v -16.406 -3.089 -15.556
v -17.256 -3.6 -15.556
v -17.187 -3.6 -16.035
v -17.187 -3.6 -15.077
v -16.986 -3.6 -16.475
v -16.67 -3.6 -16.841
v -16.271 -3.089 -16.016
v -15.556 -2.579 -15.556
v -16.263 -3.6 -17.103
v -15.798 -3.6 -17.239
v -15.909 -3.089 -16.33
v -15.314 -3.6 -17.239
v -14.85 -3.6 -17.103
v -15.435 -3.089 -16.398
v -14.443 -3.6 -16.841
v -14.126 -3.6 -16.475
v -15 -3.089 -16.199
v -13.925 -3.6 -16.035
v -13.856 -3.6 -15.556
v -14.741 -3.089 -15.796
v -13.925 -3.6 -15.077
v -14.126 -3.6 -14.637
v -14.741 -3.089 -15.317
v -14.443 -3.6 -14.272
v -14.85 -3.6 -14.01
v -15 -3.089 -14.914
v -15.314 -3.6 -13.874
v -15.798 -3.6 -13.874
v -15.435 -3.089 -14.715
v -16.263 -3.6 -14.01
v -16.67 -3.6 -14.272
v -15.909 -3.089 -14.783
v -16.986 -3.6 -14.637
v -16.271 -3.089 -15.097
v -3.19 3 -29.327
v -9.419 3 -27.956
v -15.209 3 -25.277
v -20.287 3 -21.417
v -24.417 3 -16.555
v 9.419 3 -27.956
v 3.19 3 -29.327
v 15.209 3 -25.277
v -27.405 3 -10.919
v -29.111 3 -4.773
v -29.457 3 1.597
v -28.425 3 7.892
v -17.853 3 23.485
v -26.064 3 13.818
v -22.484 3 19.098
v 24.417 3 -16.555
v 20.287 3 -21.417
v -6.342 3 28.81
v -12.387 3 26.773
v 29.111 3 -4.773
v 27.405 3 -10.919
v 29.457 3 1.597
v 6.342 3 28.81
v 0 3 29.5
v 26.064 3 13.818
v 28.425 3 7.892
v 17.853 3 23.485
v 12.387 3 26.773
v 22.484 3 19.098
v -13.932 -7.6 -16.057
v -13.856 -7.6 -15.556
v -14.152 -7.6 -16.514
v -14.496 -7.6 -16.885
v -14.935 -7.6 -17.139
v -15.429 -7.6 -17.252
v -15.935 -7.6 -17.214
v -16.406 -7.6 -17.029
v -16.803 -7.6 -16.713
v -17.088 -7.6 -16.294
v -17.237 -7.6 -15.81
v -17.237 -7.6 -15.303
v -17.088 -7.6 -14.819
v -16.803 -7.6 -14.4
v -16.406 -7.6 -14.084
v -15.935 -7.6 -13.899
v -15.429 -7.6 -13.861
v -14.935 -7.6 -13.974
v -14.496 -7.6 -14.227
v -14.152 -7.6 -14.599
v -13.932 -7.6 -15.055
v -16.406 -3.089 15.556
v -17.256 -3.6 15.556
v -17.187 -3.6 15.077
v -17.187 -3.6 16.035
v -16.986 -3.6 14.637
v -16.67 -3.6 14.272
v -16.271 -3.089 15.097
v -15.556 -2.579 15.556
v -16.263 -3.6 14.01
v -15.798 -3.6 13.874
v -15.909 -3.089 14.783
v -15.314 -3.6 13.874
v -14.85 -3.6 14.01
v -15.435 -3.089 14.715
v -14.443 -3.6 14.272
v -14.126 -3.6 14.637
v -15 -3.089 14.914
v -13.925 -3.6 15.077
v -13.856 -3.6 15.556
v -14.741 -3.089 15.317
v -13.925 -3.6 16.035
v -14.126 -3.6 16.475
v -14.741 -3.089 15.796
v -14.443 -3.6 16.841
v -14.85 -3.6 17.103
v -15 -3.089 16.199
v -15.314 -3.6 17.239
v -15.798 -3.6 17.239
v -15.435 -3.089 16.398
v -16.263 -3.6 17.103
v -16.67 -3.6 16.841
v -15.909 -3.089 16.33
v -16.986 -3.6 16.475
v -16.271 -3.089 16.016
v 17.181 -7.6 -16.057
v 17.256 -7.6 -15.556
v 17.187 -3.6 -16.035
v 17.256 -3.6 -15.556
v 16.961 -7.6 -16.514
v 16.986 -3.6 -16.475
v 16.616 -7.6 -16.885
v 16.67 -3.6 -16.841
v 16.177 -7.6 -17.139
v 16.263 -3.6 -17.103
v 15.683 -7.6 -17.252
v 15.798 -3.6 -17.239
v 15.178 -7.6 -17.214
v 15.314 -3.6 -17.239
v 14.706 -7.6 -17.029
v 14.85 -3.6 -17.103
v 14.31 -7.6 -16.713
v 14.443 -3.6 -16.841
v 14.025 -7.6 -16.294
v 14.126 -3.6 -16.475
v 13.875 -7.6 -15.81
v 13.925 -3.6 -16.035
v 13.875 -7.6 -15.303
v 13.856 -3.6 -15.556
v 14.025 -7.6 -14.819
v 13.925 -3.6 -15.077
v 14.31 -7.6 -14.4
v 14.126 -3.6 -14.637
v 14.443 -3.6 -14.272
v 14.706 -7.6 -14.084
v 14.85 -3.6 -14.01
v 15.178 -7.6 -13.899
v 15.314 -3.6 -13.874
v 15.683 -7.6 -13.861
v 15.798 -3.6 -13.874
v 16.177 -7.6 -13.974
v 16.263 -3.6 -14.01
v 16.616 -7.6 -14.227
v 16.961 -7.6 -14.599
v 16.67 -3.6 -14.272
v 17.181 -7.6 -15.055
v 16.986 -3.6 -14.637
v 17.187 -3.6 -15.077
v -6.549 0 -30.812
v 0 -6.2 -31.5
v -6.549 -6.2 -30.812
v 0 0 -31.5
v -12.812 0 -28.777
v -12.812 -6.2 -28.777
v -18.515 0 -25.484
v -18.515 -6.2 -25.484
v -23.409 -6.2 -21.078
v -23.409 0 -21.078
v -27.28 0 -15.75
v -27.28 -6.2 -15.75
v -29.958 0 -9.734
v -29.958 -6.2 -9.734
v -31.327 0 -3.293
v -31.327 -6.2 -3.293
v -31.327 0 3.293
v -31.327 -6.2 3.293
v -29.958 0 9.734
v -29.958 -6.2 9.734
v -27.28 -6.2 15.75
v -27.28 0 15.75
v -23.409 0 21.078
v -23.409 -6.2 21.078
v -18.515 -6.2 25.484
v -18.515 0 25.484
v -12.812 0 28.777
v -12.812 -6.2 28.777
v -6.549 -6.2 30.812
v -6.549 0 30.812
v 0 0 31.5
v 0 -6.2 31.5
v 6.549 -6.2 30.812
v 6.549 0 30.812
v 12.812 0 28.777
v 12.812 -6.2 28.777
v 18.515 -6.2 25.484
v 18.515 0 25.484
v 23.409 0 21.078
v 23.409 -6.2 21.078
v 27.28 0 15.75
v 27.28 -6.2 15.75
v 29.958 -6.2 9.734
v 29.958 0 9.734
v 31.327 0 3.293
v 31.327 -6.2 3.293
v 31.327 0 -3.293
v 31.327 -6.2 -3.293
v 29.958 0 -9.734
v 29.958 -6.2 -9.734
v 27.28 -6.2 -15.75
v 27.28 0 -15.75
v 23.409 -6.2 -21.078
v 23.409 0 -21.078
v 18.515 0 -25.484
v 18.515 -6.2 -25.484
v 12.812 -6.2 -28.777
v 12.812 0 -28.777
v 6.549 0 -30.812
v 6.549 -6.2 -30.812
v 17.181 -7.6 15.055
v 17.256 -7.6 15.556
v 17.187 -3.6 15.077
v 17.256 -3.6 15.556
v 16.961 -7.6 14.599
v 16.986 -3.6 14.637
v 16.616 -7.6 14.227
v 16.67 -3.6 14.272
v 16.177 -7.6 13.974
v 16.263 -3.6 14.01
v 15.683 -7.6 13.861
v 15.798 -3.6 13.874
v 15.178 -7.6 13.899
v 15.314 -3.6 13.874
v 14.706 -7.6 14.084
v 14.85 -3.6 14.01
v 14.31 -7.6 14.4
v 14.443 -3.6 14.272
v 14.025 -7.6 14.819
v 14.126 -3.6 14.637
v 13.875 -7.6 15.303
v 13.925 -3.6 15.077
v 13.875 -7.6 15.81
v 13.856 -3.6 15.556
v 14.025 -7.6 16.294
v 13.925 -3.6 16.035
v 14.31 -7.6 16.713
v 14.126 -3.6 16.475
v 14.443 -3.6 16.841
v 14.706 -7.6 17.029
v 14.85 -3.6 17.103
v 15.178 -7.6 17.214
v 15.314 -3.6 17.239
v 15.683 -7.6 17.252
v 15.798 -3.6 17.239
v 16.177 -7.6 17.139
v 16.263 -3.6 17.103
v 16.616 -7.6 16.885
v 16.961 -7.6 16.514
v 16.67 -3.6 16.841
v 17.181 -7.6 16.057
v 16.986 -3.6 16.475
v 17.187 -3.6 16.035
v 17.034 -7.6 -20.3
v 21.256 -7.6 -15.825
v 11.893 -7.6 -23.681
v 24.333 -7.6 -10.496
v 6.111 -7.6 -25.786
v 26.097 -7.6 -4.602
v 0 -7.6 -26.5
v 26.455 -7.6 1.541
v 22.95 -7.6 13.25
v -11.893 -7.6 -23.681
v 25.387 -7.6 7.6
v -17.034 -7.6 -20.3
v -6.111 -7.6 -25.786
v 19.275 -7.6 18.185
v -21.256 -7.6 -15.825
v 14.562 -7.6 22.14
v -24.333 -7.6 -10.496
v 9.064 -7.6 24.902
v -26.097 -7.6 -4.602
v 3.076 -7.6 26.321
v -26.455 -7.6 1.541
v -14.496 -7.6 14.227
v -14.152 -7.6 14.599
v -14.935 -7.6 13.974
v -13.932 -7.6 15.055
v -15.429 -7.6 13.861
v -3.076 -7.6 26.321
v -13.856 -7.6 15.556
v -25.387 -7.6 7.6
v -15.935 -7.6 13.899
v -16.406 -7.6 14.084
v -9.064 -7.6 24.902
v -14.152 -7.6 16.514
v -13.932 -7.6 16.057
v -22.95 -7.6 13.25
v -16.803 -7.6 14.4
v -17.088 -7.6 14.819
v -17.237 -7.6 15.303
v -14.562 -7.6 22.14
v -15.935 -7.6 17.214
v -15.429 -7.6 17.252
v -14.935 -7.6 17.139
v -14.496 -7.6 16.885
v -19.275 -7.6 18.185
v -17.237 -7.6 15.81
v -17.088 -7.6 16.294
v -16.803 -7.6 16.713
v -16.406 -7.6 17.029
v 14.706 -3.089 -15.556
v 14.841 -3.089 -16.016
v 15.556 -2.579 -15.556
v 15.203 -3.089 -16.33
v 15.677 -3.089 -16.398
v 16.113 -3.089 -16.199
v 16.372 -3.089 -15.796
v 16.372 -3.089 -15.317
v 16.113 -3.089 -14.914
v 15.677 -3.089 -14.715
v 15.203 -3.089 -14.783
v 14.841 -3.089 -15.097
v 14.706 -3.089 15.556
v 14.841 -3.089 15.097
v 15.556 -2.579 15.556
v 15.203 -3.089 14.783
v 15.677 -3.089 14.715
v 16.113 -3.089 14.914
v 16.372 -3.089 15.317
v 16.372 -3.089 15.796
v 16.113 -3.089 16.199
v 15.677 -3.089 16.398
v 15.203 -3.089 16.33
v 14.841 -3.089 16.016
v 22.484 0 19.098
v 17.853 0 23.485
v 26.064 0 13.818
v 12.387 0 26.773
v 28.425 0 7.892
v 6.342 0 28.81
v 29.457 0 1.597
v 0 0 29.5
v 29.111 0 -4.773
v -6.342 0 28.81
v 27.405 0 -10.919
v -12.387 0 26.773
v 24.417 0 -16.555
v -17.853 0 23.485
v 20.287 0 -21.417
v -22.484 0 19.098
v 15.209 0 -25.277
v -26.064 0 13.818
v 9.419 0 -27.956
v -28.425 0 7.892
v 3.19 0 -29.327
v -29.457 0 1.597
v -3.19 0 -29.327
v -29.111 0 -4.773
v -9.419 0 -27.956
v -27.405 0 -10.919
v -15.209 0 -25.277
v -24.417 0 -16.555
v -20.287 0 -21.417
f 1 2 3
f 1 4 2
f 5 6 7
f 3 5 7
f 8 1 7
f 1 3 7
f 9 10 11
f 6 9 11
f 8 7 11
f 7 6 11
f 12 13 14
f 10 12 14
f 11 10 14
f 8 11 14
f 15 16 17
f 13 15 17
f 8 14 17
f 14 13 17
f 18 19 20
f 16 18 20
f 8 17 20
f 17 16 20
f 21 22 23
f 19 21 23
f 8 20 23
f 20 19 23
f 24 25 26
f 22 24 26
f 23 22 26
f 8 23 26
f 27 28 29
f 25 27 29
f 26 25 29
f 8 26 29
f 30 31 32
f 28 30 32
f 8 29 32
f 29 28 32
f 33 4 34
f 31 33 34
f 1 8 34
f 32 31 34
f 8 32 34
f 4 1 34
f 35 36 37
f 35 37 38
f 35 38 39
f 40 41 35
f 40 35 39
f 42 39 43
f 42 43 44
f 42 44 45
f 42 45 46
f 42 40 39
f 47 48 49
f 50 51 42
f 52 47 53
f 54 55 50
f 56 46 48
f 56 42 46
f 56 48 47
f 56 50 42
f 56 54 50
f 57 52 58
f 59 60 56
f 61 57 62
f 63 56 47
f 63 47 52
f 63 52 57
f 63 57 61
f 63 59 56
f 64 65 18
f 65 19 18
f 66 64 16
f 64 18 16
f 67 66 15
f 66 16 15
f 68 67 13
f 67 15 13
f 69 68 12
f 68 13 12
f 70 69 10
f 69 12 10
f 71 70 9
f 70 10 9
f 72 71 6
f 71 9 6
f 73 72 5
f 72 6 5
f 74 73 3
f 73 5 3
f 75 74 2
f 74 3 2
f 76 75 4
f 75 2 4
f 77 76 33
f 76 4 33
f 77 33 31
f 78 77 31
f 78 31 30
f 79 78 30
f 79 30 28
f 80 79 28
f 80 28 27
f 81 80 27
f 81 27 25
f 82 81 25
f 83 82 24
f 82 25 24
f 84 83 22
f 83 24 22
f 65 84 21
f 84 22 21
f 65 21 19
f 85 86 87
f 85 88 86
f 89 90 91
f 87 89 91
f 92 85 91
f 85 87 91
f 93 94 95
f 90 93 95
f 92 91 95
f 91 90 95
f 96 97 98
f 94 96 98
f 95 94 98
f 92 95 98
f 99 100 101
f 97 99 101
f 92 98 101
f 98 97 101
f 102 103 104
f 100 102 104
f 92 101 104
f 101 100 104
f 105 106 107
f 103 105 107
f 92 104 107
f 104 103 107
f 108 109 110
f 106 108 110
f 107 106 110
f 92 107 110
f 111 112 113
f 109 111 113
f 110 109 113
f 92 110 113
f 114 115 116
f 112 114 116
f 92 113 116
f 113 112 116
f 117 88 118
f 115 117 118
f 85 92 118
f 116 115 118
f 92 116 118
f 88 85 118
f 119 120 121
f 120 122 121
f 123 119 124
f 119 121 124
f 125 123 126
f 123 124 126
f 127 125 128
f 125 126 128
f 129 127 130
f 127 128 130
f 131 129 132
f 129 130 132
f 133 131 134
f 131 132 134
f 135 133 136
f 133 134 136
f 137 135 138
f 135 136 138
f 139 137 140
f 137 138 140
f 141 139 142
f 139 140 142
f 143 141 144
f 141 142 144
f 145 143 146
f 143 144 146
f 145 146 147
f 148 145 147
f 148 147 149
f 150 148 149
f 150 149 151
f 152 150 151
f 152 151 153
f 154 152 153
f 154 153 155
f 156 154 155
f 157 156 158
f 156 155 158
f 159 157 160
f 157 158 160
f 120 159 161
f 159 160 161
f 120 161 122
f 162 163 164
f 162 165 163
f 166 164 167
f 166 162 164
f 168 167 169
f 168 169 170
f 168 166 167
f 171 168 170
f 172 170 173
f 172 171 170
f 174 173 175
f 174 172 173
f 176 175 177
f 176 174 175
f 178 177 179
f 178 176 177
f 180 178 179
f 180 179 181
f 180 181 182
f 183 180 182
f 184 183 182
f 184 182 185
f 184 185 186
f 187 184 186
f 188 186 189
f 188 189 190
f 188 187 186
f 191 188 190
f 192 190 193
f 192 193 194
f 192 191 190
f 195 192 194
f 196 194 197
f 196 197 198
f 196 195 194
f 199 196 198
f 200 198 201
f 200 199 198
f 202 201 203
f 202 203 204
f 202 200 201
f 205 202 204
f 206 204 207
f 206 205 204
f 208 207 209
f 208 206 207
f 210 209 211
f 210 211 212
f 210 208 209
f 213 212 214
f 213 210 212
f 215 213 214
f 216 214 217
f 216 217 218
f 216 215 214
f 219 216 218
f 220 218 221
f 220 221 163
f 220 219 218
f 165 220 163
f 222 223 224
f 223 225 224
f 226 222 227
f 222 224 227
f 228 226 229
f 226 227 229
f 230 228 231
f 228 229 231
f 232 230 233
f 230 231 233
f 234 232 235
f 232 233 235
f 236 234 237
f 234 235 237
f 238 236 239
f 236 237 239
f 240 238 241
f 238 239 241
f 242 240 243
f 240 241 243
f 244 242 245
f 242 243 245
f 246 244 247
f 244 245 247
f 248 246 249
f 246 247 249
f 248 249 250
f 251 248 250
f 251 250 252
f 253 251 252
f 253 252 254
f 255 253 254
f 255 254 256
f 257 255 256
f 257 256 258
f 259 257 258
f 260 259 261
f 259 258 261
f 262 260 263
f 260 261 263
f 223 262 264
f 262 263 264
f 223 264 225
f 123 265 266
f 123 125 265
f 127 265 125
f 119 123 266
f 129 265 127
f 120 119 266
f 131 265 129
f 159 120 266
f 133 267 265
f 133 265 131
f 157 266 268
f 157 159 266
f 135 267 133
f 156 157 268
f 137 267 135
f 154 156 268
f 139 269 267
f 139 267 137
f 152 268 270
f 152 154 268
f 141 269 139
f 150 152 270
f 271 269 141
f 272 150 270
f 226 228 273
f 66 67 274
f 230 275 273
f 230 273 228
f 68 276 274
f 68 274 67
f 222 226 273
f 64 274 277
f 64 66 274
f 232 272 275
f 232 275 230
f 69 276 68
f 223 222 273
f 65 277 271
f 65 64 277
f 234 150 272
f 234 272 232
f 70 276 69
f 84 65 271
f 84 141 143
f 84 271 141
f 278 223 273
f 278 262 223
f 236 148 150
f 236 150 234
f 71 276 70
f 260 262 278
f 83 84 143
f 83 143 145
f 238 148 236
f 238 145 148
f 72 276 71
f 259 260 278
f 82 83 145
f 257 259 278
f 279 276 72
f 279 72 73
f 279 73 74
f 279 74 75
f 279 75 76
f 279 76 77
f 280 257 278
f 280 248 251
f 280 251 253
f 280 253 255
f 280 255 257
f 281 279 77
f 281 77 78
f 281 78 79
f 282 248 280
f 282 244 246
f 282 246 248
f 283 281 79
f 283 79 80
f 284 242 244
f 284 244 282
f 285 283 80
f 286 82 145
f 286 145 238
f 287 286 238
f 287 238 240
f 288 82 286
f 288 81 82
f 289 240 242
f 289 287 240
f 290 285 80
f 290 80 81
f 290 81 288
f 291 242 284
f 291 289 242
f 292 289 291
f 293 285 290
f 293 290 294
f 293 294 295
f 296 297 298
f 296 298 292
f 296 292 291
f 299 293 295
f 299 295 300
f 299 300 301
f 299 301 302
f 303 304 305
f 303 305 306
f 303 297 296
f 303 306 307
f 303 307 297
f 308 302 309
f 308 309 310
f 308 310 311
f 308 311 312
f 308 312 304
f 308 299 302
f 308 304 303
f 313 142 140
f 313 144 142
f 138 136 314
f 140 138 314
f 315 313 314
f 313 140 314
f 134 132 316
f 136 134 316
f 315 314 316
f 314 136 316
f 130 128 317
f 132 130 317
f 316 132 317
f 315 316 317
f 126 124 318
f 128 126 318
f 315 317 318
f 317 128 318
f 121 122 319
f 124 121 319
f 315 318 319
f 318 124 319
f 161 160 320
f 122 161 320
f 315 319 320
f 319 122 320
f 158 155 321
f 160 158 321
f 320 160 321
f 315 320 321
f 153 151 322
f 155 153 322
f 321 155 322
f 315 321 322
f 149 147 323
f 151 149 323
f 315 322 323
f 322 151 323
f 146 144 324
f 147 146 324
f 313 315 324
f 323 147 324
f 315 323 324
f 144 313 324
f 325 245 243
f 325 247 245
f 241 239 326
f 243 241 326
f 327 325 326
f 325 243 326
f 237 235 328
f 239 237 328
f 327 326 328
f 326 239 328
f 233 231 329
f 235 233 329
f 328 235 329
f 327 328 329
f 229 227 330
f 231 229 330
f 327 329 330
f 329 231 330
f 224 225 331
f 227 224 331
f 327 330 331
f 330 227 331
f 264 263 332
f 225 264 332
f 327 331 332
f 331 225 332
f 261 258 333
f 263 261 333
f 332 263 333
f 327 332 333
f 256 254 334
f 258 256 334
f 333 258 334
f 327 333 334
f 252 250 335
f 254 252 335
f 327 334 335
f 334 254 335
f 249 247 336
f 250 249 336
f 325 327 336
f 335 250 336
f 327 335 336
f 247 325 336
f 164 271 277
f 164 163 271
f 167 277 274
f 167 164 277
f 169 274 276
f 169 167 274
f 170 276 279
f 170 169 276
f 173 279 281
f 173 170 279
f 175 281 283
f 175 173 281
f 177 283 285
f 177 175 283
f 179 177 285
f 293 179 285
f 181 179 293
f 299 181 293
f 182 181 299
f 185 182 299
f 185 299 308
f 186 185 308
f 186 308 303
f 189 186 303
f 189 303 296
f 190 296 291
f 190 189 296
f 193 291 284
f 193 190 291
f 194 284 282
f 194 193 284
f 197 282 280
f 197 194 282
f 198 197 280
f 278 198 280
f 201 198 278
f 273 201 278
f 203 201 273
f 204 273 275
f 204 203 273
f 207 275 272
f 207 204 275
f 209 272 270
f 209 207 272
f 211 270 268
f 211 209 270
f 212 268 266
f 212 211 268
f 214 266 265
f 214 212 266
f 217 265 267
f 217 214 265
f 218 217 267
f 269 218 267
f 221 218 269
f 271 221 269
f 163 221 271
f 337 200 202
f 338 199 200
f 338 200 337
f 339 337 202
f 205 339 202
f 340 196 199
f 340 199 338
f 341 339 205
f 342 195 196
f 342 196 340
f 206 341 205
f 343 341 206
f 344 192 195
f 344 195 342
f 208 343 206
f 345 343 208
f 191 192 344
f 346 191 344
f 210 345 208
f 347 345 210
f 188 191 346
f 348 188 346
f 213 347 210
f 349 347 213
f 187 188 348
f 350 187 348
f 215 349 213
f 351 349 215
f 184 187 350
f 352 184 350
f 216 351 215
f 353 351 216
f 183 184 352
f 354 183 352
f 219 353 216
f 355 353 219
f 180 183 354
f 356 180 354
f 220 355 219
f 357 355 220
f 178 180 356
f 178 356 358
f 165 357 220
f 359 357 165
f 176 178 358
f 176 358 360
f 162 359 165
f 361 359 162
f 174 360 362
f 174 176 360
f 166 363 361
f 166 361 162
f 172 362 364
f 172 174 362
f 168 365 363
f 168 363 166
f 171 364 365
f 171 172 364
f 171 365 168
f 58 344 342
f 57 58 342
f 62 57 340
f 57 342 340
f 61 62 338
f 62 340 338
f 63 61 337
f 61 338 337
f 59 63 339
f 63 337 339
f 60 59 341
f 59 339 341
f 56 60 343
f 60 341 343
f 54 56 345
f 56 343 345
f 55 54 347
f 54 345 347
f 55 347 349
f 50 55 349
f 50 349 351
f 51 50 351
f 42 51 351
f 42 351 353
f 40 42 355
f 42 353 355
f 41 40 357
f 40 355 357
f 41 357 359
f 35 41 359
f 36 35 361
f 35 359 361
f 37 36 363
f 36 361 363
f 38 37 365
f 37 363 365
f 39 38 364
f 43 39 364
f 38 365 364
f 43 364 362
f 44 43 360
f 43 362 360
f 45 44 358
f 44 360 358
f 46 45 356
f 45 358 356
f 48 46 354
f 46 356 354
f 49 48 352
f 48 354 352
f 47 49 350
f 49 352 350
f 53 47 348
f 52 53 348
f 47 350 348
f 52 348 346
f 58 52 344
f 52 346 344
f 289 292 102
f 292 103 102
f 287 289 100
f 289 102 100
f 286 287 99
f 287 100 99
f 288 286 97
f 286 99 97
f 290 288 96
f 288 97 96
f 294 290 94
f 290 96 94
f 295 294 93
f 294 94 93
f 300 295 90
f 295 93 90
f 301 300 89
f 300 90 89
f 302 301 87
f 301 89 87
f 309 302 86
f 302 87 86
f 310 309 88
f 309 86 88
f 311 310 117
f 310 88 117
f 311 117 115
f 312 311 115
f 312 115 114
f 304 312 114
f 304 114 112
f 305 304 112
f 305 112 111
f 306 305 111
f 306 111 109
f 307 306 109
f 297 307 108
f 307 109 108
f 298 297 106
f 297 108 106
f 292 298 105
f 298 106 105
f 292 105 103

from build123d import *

# Parameters (mm, degrees)
M3_CLEARANCE_HOLE1_D     = 3.4
M3_CLEARANCE_HOLE1_DEPTH = 4
M3_CLEARANCE_HOLE1_TIP   = 1.021463052
SKETCH5_R                = 29.5
BOSS_EXTRUDE1_DEPTH      = 3


with BuildPart() as part:
    # Sketch1 → Revolve1 (revolve)
    with BuildSketch(Plane.XY, mode=Mode.PRIVATE) as revolve1_sk:
        Polygon((-26.5, -7.6), (-31.5, -6.2), (-31.5, 0), (0, 0), (0, -7.6), align=None)
    revolve(revolve1_sk.sketch.rotate(Axis((0, -13.2, 0), (0, 1, 0)), 270), axis=Axis((0, -13.2, 0), (0, 1, 0)))

    # M3 Clearance Hole1
    with Locations(Plane(origin=(0, -7.6, 0), x_dir=(-1, 0, 0), z_dir=(0, -1, 0))):
        with Locations((15.556349186, -15.556349186), (15.556349186, 15.556349186), (-15.556349186, 15.556349186), (-15.556349186, -15.556349186)):
            Hole(M3_CLEARANCE_HOLE1_D / 2, depth=M3_CLEARANCE_HOLE1_DEPTH)
            with Locations((0, 0, -(M3_CLEARANCE_HOLE1_DEPTH + M3_CLEARANCE_HOLE1_TIP / 2))):  # 118° drill point
                Cone(0, M3_CLEARANCE_HOLE1_D / 2, M3_CLEARANCE_HOLE1_TIP, mode=Mode.SUBTRACT)

    # Sketch5 → Boss-Extrude1 (add)
    with BuildSketch(Plane(origin=(0, 0, 0), x_dir=(1, 0, 0), z_dir=(0, 1, 0))):
        with Locations(Location((0, 0, 0), (0, 0, 270))):
            Circle(SKETCH5_R)
    extrude(amount=BOSS_EXTRUDE1_DEPTH)


solid = part.part
